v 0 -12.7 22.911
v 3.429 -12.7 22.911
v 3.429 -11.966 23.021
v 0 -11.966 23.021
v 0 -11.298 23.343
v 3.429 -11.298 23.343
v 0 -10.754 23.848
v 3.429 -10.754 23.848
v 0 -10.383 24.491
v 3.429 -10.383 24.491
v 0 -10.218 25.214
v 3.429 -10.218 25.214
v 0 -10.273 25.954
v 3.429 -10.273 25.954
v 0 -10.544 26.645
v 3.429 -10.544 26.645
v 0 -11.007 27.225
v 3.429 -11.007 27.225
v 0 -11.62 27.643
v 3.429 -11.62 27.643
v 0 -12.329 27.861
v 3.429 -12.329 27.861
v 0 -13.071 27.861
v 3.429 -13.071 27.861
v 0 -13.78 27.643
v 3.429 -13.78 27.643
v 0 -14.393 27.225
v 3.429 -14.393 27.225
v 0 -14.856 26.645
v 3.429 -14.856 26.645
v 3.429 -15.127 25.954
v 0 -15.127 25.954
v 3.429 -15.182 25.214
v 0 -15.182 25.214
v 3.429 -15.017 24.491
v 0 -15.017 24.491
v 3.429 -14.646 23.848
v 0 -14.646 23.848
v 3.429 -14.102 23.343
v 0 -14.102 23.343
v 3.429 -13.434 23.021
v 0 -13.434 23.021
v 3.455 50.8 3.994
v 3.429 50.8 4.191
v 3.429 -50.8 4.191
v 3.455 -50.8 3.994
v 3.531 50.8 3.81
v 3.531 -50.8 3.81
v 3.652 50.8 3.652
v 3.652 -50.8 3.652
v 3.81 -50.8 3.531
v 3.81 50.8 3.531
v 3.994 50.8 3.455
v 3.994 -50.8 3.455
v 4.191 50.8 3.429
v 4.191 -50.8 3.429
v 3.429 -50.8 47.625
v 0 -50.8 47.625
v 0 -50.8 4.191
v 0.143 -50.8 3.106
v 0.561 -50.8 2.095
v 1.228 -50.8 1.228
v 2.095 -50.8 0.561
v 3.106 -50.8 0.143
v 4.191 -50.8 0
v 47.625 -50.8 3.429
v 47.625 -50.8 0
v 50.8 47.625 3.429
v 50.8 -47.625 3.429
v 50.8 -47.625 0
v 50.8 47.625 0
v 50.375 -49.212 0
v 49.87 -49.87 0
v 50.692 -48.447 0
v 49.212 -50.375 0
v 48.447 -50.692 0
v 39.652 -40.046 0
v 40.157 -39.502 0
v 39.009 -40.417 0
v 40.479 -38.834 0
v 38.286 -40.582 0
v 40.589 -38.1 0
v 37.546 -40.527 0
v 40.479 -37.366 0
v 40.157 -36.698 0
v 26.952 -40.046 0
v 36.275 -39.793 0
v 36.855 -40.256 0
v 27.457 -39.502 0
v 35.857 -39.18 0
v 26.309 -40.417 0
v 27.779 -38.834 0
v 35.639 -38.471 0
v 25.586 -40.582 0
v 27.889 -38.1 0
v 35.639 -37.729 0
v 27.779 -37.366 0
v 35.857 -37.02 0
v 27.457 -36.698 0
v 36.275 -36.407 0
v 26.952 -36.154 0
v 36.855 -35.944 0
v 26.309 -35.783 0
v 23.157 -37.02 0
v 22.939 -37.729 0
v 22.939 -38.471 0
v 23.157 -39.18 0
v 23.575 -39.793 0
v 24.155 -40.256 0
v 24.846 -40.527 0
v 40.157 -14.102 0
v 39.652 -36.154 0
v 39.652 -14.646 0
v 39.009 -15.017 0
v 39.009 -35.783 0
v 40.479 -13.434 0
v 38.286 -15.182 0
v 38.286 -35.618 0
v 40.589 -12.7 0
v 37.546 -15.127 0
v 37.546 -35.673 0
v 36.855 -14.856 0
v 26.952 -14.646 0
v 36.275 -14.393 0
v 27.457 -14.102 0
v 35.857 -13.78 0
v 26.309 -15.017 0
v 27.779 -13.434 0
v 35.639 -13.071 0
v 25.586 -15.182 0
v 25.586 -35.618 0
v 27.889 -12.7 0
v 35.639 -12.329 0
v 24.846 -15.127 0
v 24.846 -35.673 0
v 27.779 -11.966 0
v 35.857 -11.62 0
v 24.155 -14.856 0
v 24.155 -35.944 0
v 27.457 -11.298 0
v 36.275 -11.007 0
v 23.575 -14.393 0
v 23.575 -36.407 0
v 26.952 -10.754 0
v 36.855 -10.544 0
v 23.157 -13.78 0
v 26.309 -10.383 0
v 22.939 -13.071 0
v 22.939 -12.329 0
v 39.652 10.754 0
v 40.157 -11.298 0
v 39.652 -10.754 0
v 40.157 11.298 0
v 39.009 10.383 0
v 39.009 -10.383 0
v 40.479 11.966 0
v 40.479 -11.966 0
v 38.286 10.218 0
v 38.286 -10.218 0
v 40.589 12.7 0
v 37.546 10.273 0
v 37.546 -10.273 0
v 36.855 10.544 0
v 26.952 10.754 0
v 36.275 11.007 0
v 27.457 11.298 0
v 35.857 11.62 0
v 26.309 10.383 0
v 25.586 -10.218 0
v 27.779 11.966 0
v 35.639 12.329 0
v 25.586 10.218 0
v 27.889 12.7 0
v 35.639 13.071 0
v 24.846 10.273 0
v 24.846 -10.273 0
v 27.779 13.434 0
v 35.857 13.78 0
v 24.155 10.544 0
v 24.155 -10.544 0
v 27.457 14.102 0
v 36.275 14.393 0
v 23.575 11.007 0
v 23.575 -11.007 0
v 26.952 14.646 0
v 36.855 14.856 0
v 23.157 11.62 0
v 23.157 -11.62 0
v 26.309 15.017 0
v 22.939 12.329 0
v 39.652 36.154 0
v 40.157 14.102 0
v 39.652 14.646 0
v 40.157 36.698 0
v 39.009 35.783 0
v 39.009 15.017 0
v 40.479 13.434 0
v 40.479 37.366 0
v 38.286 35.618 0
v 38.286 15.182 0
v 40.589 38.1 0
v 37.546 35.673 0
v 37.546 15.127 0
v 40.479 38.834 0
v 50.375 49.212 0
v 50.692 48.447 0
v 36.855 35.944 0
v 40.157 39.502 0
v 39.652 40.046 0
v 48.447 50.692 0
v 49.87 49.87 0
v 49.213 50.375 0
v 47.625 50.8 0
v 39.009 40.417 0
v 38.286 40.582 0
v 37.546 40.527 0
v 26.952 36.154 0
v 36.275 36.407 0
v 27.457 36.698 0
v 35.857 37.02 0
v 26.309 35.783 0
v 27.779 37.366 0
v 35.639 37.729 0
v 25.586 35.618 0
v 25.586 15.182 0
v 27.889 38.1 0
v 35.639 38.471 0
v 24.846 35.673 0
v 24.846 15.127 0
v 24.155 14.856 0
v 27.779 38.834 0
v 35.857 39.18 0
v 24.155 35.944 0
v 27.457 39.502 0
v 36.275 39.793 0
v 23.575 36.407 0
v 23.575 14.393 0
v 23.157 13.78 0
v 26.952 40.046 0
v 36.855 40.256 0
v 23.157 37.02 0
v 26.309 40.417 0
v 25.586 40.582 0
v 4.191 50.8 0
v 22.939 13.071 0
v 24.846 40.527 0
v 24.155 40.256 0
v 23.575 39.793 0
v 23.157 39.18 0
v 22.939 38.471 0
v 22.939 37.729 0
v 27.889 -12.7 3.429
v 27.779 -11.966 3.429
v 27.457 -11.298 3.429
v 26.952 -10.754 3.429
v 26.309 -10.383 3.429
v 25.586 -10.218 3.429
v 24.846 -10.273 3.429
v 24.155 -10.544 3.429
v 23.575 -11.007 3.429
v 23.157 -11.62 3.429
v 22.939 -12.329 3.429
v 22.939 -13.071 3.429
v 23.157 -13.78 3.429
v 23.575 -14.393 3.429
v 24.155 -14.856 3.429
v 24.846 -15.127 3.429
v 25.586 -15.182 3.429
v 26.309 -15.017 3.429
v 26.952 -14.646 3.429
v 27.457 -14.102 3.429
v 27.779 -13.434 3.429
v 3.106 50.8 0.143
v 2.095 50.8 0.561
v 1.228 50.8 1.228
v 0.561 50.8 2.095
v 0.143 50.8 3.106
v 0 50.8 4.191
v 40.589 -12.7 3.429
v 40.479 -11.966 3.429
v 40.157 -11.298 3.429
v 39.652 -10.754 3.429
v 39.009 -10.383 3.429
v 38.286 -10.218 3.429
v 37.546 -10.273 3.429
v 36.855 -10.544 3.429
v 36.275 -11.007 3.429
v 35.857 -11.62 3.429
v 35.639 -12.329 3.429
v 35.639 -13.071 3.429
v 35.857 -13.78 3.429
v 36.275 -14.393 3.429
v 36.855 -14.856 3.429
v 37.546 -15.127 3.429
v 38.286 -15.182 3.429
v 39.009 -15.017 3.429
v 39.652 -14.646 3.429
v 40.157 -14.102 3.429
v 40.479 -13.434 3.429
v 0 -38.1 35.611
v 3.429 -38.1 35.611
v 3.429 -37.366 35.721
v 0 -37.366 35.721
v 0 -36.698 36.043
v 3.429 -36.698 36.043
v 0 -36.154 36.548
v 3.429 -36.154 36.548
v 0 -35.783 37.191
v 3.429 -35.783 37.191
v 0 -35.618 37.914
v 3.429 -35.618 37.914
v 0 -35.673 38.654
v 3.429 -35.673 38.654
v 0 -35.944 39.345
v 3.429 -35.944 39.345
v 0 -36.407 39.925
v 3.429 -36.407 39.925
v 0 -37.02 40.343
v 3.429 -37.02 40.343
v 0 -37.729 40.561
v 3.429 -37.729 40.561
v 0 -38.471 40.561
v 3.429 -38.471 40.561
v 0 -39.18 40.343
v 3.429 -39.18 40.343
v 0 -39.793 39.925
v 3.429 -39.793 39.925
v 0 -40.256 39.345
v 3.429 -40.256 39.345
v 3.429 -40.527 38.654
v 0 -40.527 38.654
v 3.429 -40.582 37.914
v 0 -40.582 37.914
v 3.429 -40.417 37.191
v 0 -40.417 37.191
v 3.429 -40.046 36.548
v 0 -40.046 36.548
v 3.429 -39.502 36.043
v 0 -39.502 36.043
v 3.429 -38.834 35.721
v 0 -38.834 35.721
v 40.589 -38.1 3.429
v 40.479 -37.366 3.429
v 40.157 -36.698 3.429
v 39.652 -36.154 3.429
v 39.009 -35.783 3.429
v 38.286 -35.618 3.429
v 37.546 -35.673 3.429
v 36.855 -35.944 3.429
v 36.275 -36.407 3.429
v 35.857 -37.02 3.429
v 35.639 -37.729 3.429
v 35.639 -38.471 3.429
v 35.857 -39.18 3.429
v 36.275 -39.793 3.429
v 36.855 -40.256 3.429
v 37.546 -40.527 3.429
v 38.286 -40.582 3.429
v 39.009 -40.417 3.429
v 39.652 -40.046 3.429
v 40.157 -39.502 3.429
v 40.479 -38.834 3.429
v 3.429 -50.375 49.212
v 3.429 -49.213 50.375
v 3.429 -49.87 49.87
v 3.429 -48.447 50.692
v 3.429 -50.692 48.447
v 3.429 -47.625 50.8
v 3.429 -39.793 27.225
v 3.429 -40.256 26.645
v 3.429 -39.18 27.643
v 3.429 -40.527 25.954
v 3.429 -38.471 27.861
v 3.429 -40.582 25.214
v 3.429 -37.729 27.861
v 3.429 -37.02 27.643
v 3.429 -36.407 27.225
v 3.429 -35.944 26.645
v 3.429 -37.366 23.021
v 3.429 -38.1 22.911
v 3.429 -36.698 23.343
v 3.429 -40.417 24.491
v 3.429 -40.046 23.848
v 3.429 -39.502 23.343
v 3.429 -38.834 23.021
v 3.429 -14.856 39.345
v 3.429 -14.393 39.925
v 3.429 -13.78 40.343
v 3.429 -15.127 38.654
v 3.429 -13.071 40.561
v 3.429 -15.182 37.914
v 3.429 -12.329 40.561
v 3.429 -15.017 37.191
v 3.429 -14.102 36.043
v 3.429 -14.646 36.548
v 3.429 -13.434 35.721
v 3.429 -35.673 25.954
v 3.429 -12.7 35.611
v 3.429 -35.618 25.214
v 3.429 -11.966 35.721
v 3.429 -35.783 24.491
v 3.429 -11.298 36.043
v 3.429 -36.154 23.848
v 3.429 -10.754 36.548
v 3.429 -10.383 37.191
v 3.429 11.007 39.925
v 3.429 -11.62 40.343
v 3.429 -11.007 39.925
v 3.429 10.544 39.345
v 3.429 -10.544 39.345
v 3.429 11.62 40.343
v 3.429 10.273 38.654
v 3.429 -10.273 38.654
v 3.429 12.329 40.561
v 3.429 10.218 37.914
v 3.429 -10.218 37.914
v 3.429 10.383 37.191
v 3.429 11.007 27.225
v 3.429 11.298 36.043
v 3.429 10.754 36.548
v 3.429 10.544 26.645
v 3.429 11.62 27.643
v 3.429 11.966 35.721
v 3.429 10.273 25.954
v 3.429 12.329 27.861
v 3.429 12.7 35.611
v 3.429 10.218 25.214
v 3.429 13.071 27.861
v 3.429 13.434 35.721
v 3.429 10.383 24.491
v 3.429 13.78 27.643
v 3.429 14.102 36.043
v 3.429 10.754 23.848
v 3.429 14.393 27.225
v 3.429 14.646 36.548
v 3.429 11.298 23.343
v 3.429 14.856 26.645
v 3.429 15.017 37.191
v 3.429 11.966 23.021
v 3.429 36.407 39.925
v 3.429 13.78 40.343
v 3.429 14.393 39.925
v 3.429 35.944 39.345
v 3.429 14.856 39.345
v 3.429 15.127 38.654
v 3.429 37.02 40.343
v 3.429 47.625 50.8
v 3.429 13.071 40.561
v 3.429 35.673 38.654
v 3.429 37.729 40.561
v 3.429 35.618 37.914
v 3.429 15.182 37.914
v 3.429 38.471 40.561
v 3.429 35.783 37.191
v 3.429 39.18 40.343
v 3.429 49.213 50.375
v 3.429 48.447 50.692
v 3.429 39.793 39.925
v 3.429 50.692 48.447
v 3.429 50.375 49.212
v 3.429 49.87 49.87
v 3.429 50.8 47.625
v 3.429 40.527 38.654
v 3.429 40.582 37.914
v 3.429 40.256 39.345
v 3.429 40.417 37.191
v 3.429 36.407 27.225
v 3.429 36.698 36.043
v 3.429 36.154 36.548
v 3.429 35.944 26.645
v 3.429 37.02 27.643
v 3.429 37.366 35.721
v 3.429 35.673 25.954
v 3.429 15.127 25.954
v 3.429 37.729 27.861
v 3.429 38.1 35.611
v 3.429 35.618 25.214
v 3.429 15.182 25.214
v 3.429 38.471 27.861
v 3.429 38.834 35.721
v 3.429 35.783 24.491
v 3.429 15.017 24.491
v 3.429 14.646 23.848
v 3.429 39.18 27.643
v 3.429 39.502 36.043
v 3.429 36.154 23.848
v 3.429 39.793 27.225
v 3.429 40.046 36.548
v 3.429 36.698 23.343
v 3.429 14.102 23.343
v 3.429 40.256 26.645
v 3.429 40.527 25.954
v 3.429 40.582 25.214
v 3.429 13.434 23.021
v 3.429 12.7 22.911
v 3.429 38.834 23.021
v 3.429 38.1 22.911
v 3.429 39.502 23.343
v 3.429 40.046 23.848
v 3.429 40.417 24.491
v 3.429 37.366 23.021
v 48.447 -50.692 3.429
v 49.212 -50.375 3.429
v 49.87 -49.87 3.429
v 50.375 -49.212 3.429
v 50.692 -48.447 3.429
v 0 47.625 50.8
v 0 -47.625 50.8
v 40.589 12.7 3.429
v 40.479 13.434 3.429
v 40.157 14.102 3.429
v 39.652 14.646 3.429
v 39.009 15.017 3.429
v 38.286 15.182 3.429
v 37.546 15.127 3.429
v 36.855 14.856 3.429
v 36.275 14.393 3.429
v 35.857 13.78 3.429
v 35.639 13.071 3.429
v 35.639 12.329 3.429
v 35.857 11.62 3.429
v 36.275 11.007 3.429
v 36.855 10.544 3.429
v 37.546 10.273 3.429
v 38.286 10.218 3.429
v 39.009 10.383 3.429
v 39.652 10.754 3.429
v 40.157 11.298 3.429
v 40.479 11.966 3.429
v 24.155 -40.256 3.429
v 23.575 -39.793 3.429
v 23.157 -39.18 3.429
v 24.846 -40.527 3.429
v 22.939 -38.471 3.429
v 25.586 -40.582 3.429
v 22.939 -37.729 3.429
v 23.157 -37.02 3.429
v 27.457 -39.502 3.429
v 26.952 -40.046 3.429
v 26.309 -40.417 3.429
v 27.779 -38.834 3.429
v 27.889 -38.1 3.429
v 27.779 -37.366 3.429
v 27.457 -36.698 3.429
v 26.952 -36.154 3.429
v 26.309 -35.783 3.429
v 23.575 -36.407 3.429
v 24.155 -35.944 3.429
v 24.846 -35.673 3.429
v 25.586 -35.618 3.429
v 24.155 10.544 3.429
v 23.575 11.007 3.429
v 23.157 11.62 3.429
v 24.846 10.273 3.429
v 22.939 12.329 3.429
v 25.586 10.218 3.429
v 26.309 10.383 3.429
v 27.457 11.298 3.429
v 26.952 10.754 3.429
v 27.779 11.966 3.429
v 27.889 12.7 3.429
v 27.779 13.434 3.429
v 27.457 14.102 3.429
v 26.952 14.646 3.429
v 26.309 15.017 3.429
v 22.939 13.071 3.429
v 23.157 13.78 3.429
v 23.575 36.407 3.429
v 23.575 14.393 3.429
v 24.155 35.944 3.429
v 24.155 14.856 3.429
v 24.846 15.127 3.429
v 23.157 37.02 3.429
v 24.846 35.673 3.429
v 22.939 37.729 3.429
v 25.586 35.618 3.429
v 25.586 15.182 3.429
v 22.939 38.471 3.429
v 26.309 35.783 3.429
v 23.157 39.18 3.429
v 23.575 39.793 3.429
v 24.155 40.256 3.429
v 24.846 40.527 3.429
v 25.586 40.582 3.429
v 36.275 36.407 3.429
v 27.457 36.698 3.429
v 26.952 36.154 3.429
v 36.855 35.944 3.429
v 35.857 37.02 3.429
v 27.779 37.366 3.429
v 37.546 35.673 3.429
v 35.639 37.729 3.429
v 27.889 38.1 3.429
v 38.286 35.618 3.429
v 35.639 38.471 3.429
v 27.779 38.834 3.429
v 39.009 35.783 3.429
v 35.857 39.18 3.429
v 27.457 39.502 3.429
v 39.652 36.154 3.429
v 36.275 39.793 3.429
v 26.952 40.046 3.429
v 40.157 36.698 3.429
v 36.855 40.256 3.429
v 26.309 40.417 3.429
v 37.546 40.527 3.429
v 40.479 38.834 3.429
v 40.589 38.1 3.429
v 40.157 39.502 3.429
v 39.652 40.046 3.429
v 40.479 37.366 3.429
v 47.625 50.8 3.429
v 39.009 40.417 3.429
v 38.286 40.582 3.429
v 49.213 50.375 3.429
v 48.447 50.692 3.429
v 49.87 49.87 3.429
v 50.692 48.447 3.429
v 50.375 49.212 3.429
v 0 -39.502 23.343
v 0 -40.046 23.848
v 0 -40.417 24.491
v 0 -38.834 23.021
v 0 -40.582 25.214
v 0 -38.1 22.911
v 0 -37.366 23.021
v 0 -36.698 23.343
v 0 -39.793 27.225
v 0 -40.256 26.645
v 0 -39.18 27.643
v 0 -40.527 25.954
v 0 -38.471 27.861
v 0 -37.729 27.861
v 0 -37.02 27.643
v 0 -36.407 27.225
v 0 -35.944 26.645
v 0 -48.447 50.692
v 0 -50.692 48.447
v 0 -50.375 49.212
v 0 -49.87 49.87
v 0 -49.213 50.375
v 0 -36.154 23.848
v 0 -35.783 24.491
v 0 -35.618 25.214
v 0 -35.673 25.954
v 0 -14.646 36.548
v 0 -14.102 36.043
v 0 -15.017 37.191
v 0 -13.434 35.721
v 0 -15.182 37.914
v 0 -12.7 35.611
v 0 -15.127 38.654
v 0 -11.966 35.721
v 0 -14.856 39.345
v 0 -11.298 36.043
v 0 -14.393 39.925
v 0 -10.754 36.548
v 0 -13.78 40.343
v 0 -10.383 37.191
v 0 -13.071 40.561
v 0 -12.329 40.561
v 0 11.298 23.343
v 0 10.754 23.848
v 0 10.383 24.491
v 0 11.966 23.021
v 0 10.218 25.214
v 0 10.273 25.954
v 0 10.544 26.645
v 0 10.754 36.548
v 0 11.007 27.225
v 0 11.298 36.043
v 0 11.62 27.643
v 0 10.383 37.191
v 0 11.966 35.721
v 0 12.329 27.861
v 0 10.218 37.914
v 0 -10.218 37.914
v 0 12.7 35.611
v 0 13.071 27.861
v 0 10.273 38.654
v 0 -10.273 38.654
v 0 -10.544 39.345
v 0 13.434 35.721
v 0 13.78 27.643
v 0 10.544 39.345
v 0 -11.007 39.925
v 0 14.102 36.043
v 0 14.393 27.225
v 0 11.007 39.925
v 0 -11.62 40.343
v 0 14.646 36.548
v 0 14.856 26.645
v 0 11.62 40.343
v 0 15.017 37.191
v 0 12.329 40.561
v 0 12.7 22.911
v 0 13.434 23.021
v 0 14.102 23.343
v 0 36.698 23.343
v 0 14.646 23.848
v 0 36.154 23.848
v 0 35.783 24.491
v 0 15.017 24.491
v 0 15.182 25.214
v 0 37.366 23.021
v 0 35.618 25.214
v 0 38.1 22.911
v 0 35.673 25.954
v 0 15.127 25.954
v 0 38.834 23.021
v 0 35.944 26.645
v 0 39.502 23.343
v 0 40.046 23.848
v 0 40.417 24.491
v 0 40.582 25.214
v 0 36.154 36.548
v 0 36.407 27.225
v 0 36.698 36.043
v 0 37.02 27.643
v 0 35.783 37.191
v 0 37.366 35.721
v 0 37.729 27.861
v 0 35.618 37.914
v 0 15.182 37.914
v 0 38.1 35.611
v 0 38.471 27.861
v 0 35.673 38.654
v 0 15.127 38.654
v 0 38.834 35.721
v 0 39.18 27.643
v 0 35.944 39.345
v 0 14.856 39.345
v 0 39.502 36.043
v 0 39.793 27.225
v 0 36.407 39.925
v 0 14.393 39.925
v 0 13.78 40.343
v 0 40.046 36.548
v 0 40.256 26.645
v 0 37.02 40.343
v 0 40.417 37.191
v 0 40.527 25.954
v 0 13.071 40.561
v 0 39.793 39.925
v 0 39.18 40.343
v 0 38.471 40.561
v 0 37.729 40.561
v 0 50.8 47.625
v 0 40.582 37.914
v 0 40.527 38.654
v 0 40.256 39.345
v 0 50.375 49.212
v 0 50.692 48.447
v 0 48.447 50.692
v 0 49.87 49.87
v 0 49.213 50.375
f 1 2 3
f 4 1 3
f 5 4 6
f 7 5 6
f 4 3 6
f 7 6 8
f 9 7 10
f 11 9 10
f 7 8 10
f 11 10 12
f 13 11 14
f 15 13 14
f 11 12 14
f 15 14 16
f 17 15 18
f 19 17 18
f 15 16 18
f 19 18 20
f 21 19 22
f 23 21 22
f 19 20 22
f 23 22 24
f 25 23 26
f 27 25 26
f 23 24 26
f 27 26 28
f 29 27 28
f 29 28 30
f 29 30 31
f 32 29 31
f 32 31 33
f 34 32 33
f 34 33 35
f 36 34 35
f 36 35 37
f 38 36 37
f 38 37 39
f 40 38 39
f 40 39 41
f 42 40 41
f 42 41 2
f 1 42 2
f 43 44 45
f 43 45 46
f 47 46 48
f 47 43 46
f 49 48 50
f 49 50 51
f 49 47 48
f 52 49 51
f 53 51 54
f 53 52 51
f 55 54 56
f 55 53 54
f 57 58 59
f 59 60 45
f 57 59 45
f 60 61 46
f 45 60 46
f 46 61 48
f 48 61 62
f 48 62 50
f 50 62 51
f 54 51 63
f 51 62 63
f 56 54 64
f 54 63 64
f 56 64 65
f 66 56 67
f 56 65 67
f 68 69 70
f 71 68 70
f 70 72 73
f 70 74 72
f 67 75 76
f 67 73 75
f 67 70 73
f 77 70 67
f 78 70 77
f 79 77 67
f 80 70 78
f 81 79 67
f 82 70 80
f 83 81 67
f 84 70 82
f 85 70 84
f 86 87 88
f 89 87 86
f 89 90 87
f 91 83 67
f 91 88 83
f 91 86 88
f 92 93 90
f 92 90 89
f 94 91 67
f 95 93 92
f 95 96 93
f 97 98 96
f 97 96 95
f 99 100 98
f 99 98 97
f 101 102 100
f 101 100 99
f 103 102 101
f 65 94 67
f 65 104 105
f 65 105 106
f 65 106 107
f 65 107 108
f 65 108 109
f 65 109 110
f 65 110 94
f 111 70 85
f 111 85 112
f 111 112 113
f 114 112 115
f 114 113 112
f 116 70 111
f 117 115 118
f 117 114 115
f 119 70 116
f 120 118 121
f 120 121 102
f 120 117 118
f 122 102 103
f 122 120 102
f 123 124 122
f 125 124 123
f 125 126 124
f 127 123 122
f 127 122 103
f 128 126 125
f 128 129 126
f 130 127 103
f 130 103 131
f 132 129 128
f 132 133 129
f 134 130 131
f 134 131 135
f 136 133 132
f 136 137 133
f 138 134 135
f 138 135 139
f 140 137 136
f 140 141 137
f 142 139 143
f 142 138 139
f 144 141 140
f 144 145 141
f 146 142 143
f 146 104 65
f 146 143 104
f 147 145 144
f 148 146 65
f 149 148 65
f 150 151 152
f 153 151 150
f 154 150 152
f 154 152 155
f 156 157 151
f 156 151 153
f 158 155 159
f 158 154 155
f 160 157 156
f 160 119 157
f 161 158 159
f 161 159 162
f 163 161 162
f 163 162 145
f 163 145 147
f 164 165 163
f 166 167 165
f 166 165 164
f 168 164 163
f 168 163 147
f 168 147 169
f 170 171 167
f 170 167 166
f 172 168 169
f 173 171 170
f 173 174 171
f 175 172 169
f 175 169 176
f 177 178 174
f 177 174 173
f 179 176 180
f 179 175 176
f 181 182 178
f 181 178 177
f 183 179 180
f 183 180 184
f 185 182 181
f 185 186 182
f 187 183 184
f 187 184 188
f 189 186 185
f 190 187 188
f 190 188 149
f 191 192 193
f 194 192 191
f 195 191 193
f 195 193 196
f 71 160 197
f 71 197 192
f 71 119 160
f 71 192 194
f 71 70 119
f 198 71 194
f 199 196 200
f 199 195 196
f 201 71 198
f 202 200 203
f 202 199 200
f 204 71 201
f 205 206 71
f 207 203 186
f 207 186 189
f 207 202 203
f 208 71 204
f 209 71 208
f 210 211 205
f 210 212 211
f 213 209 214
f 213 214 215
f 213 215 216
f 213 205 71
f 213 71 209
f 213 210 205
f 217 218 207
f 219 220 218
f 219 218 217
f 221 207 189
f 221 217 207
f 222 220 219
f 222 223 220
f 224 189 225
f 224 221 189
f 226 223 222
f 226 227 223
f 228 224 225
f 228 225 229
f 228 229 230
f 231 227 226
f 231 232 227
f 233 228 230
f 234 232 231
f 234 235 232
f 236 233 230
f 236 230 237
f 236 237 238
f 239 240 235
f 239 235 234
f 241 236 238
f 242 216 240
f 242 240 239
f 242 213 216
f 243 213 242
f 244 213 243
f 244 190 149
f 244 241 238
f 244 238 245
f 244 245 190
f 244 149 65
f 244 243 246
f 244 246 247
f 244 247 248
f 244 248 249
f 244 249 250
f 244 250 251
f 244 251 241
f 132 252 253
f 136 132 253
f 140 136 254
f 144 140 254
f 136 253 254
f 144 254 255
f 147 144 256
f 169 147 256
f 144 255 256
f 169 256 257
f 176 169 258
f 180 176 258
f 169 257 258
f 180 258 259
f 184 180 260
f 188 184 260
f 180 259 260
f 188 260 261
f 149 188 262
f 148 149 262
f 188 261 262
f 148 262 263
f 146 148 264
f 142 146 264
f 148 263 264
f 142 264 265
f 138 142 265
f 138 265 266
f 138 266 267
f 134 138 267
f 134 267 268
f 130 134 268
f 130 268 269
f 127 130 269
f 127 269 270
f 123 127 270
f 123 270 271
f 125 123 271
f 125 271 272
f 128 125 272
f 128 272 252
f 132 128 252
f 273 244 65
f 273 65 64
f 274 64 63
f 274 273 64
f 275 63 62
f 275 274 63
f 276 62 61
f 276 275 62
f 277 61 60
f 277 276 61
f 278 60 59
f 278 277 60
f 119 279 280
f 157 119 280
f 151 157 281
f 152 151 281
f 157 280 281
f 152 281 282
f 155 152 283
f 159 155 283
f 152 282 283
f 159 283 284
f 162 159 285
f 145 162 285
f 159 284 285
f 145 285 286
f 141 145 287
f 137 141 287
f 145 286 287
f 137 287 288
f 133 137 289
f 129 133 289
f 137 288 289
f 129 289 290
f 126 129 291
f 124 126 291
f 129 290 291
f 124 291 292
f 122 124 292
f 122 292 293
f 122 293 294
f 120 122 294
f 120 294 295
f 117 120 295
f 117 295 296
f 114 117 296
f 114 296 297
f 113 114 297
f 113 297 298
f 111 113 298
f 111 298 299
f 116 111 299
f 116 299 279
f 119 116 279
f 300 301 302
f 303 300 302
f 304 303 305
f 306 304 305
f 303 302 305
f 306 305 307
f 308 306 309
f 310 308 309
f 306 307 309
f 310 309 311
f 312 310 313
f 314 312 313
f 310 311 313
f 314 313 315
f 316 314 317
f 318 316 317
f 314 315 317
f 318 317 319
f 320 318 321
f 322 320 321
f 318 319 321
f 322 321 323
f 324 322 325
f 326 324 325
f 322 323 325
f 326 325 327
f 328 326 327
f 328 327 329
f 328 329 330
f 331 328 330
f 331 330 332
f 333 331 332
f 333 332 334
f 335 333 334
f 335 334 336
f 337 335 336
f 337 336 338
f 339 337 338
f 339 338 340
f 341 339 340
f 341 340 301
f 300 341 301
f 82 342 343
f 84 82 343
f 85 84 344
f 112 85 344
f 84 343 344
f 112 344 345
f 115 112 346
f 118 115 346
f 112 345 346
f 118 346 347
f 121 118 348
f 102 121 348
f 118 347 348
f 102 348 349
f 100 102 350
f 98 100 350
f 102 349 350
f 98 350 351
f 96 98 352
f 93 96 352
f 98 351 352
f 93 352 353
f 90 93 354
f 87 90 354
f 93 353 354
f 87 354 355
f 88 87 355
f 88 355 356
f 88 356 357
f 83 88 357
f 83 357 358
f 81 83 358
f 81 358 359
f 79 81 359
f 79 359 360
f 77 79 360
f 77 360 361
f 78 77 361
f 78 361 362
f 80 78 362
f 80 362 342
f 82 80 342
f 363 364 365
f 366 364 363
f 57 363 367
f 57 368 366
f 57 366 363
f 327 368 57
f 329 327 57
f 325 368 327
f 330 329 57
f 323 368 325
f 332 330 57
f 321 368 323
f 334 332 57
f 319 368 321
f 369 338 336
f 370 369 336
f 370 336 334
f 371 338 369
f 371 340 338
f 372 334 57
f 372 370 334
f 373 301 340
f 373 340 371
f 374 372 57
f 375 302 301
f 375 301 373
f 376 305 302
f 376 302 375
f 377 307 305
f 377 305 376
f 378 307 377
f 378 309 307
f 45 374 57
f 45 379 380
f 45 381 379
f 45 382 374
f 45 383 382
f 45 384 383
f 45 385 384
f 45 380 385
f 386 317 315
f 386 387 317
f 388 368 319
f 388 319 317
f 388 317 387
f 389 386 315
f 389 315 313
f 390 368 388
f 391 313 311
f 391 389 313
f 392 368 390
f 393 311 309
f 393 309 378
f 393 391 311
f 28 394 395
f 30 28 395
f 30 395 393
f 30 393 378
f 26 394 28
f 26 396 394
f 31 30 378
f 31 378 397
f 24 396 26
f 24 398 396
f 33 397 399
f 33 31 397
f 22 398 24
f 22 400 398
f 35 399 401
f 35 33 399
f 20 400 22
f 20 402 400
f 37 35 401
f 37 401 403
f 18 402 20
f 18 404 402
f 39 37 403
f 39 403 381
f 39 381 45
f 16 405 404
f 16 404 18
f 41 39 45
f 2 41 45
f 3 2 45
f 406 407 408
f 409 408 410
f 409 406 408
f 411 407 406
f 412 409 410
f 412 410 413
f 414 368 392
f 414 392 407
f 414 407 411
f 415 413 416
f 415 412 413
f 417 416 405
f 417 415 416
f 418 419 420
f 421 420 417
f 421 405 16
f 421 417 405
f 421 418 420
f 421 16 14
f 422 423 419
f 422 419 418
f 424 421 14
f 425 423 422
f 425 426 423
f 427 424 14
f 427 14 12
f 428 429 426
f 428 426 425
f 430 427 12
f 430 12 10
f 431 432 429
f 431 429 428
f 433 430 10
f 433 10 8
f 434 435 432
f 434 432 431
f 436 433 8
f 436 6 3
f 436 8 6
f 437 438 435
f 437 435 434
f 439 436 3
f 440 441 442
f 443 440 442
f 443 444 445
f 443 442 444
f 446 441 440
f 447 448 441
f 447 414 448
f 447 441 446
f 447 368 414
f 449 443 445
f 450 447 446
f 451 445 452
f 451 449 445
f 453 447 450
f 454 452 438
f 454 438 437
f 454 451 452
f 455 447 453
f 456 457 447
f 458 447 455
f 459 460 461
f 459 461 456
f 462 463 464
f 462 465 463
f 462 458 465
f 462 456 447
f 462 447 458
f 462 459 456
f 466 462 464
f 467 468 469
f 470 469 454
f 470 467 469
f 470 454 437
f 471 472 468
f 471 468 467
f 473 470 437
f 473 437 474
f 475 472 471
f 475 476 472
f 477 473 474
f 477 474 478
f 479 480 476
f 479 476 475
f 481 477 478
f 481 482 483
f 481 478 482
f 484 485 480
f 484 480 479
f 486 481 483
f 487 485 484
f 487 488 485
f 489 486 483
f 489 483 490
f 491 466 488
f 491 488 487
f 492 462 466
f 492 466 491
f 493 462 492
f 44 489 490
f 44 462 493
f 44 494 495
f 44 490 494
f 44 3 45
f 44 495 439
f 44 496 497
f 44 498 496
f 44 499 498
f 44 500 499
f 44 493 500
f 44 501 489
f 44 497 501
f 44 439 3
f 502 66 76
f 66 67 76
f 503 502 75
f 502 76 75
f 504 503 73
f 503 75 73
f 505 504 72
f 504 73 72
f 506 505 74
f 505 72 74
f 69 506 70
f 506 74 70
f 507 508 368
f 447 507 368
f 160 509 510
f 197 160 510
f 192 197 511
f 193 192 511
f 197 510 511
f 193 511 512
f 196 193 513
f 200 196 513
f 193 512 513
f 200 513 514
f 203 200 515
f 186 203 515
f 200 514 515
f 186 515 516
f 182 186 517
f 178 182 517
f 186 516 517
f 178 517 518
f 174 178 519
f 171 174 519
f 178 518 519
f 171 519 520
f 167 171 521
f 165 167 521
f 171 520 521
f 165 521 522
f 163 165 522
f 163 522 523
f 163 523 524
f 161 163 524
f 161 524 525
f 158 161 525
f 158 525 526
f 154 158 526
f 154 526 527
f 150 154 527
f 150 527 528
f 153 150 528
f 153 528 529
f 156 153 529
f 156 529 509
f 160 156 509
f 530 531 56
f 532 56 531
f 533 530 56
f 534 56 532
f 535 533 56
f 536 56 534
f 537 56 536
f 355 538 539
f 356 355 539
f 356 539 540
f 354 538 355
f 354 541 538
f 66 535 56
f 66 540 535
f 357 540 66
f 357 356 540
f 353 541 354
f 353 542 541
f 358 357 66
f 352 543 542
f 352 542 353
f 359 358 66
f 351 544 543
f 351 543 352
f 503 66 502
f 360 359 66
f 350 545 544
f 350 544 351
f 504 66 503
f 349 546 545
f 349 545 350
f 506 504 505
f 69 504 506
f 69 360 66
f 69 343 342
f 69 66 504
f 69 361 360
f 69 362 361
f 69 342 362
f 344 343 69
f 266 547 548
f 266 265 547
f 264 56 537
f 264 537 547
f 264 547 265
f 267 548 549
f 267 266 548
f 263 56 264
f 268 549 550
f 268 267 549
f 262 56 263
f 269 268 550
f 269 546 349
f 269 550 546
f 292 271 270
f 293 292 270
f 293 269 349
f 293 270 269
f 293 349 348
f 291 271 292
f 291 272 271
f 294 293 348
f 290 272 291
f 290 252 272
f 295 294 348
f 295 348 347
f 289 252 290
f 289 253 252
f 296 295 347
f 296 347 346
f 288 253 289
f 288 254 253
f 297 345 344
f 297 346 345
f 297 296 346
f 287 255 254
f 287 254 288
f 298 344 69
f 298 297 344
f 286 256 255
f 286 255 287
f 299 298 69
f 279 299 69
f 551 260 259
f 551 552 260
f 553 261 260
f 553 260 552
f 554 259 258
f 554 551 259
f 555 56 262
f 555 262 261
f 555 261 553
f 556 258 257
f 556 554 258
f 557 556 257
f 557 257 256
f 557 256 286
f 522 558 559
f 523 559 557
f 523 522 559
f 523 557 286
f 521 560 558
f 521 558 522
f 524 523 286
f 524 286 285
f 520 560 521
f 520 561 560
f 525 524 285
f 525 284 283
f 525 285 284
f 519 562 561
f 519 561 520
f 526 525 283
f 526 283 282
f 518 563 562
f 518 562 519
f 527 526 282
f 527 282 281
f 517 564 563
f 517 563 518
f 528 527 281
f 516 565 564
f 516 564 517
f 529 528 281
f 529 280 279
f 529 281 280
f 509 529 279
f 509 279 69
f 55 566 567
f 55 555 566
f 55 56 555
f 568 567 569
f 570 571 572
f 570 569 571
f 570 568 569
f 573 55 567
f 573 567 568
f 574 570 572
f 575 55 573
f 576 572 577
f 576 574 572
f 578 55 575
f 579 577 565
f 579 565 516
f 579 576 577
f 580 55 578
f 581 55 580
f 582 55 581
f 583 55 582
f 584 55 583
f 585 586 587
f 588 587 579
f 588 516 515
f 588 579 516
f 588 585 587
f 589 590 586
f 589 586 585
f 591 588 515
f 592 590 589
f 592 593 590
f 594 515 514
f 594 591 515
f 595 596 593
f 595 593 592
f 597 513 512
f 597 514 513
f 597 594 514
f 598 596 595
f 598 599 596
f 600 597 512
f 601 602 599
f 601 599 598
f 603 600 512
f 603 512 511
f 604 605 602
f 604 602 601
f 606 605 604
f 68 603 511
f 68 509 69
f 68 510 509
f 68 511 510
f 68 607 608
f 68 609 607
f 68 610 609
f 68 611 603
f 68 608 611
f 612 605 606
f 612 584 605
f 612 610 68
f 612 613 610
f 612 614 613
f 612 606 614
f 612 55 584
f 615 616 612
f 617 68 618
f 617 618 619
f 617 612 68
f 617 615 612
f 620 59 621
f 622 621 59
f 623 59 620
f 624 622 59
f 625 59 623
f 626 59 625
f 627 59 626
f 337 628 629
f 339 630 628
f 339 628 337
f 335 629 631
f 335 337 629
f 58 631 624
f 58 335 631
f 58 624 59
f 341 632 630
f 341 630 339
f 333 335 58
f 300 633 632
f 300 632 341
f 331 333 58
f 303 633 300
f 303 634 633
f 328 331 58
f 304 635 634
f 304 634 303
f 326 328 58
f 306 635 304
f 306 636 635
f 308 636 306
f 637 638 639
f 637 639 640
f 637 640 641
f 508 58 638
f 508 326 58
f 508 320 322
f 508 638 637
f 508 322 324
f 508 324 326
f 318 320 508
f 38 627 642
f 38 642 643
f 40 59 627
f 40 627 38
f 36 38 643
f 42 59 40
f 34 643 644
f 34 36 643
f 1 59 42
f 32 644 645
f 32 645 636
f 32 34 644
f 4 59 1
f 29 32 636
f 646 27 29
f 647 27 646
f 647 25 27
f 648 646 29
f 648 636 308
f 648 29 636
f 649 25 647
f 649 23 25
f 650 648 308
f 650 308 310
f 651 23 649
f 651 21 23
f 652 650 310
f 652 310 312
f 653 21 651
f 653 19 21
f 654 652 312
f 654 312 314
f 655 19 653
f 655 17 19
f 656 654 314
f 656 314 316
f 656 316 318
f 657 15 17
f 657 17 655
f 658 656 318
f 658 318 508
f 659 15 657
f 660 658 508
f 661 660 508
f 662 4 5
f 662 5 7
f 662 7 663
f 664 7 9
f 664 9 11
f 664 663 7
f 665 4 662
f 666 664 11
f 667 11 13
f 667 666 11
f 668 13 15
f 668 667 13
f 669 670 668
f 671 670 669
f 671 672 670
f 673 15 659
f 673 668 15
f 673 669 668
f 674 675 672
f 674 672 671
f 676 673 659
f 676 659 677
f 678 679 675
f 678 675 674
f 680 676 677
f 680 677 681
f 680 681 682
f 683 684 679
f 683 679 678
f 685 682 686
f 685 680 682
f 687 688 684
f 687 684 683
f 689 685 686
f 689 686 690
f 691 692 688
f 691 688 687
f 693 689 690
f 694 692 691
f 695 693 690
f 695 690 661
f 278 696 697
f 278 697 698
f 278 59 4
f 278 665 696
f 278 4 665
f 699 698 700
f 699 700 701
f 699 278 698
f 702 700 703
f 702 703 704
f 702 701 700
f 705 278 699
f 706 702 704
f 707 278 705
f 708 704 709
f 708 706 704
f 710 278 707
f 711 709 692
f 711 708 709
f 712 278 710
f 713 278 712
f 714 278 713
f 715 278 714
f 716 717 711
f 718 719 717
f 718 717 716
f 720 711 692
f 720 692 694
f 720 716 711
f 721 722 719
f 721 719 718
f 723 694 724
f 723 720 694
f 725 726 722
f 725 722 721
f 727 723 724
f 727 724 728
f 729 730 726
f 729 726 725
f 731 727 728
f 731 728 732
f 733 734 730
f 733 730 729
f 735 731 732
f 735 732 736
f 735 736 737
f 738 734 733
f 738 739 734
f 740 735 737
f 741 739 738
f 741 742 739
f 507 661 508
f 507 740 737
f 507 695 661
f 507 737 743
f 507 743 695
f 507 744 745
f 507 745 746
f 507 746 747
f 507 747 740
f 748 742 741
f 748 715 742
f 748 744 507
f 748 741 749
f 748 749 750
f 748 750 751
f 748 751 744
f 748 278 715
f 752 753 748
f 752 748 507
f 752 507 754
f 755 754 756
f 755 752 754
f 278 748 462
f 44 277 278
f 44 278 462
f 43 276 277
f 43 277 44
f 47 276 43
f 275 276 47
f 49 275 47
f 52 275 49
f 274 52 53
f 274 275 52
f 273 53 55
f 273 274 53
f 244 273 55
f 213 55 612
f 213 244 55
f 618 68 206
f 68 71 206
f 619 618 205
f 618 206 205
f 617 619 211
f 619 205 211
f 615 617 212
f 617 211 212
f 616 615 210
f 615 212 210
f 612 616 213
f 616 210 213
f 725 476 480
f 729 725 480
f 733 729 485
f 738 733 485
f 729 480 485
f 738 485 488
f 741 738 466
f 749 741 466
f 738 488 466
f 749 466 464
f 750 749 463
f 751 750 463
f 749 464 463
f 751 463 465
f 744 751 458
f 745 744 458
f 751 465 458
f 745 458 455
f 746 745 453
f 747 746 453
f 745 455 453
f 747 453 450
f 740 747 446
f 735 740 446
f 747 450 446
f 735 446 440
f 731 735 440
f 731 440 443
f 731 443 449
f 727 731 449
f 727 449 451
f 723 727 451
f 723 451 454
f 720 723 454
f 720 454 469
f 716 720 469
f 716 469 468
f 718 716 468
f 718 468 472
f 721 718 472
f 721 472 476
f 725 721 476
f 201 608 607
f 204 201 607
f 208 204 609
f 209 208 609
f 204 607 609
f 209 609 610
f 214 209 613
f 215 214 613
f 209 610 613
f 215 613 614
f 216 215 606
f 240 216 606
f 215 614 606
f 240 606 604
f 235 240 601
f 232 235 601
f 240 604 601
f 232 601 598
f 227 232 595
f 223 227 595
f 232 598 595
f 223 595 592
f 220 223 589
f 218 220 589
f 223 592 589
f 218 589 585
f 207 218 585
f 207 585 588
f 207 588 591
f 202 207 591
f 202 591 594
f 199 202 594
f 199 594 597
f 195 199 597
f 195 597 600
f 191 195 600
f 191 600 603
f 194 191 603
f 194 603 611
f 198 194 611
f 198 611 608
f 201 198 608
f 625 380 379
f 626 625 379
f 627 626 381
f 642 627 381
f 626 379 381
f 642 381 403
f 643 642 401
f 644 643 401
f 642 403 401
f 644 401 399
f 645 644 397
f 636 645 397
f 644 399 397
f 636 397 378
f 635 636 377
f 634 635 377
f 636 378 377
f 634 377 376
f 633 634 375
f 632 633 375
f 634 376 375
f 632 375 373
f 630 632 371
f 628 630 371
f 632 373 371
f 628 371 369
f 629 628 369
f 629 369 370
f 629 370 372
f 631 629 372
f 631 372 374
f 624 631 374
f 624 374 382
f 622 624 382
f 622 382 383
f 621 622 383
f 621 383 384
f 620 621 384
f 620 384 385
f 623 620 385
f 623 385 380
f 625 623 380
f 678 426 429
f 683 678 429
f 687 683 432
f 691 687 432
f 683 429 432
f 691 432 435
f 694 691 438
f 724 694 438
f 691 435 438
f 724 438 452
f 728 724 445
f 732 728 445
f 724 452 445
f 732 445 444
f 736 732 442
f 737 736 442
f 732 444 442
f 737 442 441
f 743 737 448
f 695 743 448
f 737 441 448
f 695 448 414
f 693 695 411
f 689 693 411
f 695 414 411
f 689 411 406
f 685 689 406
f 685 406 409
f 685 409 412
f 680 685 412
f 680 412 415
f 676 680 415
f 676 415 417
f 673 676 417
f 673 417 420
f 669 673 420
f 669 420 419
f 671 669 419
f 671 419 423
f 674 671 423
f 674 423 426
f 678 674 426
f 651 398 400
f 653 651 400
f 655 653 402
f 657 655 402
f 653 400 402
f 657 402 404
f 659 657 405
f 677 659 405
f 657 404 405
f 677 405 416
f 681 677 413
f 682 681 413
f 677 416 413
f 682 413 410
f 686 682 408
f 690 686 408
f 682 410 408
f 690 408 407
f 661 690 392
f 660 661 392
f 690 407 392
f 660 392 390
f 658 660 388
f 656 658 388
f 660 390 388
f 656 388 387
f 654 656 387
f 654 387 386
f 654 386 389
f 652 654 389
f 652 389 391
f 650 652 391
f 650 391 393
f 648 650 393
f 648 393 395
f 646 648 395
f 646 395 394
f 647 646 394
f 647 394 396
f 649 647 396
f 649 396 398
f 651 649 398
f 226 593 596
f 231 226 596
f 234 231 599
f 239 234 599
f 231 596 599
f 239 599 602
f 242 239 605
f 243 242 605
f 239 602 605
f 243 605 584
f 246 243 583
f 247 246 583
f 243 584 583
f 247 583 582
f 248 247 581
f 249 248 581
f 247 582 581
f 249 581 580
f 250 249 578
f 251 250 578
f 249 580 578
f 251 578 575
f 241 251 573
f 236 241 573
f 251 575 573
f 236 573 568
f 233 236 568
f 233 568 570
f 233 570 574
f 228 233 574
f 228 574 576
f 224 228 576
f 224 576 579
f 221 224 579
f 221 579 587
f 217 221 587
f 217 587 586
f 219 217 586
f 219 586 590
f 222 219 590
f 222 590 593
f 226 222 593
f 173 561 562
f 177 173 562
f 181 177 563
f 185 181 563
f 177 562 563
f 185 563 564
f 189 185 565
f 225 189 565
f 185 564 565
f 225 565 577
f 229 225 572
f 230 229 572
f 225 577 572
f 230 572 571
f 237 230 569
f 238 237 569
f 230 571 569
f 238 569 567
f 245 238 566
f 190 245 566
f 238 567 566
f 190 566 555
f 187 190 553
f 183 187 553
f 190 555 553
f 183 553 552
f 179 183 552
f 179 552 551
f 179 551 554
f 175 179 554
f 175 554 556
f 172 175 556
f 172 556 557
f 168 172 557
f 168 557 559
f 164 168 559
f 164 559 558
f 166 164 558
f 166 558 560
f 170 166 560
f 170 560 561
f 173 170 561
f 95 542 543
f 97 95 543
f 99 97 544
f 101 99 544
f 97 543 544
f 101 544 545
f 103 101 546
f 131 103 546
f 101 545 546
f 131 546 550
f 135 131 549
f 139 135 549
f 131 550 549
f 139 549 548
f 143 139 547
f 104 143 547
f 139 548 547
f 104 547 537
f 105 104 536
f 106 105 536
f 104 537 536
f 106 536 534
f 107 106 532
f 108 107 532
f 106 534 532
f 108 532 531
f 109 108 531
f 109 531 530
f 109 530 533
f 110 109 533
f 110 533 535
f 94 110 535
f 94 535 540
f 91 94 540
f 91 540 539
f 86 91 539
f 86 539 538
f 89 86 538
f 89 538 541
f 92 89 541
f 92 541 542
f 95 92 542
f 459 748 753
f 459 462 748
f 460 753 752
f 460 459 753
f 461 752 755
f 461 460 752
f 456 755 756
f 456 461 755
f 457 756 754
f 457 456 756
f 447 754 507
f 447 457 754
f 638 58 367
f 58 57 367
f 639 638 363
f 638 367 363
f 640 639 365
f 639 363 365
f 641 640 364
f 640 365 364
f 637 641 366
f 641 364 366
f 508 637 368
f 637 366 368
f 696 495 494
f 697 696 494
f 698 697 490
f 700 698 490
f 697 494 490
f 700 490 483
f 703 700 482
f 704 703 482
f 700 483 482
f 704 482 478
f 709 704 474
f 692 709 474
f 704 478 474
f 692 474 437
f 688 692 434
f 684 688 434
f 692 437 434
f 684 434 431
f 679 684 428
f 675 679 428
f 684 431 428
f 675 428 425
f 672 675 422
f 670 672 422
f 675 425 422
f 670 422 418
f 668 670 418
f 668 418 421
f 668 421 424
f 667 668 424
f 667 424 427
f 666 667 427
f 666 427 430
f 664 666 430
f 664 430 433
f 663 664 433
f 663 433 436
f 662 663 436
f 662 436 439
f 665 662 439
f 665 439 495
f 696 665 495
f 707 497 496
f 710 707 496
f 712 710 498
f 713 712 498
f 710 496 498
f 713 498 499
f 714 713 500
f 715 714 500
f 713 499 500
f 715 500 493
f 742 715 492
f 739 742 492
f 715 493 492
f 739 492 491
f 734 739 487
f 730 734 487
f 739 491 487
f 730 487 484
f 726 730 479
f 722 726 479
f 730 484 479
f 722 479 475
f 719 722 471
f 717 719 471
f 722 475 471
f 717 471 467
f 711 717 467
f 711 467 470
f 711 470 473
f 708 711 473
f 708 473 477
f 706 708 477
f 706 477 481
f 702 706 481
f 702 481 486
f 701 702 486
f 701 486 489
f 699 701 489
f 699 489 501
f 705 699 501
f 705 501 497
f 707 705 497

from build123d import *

# Parameters (mm, degrees)
BASE_FLANGE1_DEPTH = 50.8
SKETCH6_R          = 2.4892
CUT_EXTRUDE1_DEPTH = 87.054004212
SKETCH7_R          = 2.4892
CUT_EXTRUDE2_DEPTH = 87.054004212
FILLET1_R          = 3.175


# Sheet-metal steps are written as plain solids
with BuildPart() as part:
    # Sketch1 → Base-Flange1 (new, symmetric)
    with BuildSketch(Plane(origin=(0, 0, 0), x_dir=(1, 0, 0), z_dir=(0, 1, 0))):
        with BuildLine():
            Line((50.8, 0), (4.191, 0))
            ThreePointArc((4.191, 0), (1.22751548, -1.22751548), (0, -4.191))
            Line((0, -4.191), (0, -50.8))
            Line((0, -50.8), (3.429, -50.8))
            Line((3.429, -50.8), (3.429, -4.191))
            ThreePointArc((3.429, -4.191), (3.652184633, -3.652184633), (4.191, -3.429))
            Line((4.191, -3.429), (50.8, -3.429))
            Line((50.8, -3.429), (50.8, 0))
        make_face()
    extrude(amount=BASE_FLANGE1_DEPTH, both=True)

    # Sketch6 → Cut-Extrude1 (cut, through all)
    with BuildSketch(Plane(origin=(3.429, 0, 0), x_dir=(0, 0, -1), z_dir=(1, 0, 0))):
        with Locations((-38.1, 38.1)):
            Circle(SKETCH6_R)
        with Locations((-25.4, 38.1)):
            Circle(SKETCH6_R)
        with Locations((-38.1, 12.7)):
            Circle(SKETCH6_R)
        with Locations((-25.4, 12.7)):
            Circle(SKETCH6_R)
        with Locations((-38.1, -12.7)):
            Circle(SKETCH6_R)
        with Locations((-25.4, -12.7)):
            Circle(SKETCH6_R)
        with Locations((-38.1, -38.1)):
            Circle(SKETCH6_R)
        with Locations((-25.4, -38.1)):
            Circle(SKETCH6_R)
    extrude(amount=-CUT_EXTRUDE1_DEPTH, mode=Mode.SUBTRACT)

    # Sketch7 → Cut-Extrude2 (cut, through all)
    with BuildSketch(Plane.XY.offset(3.429)):
        with Locations((25.4, 38.1)):
            Circle(SKETCH7_R)
        with Locations((38.1, 38.1)):
            Circle(SKETCH7_R)
        with Locations((25.4, 12.7)):
            Circle(SKETCH7_R)
        with Locations((38.1, 12.7)):
            Circle(SKETCH7_R)
        with Locations((25.4, -12.7)):
            Circle(SKETCH7_R)
        with Locations((38.1, -12.7)):
            Circle(SKETCH7_R)
        with Locations((25.4, -38.1)):
            Circle(SKETCH7_R)
        with Locations((38.1, -38.1)):
            Circle(SKETCH7_R)
    extrude(amount=-CUT_EXTRUDE2_DEPTH, mode=Mode.SUBTRACT)

    # Fillet1
    fillet1_edges = [part.edges().sort_by_distance(p)[0] for p in [
        (1.7145, 50.8, 50.8),
        (1.7145, -50.8, 50.8),
        (50.8, 50.8, 1.7145),
        (50.8, -50.8, 1.7145),
    ]]
    fillet(fillet1_edges, radius=FILLET1_R)


solid = part.part
